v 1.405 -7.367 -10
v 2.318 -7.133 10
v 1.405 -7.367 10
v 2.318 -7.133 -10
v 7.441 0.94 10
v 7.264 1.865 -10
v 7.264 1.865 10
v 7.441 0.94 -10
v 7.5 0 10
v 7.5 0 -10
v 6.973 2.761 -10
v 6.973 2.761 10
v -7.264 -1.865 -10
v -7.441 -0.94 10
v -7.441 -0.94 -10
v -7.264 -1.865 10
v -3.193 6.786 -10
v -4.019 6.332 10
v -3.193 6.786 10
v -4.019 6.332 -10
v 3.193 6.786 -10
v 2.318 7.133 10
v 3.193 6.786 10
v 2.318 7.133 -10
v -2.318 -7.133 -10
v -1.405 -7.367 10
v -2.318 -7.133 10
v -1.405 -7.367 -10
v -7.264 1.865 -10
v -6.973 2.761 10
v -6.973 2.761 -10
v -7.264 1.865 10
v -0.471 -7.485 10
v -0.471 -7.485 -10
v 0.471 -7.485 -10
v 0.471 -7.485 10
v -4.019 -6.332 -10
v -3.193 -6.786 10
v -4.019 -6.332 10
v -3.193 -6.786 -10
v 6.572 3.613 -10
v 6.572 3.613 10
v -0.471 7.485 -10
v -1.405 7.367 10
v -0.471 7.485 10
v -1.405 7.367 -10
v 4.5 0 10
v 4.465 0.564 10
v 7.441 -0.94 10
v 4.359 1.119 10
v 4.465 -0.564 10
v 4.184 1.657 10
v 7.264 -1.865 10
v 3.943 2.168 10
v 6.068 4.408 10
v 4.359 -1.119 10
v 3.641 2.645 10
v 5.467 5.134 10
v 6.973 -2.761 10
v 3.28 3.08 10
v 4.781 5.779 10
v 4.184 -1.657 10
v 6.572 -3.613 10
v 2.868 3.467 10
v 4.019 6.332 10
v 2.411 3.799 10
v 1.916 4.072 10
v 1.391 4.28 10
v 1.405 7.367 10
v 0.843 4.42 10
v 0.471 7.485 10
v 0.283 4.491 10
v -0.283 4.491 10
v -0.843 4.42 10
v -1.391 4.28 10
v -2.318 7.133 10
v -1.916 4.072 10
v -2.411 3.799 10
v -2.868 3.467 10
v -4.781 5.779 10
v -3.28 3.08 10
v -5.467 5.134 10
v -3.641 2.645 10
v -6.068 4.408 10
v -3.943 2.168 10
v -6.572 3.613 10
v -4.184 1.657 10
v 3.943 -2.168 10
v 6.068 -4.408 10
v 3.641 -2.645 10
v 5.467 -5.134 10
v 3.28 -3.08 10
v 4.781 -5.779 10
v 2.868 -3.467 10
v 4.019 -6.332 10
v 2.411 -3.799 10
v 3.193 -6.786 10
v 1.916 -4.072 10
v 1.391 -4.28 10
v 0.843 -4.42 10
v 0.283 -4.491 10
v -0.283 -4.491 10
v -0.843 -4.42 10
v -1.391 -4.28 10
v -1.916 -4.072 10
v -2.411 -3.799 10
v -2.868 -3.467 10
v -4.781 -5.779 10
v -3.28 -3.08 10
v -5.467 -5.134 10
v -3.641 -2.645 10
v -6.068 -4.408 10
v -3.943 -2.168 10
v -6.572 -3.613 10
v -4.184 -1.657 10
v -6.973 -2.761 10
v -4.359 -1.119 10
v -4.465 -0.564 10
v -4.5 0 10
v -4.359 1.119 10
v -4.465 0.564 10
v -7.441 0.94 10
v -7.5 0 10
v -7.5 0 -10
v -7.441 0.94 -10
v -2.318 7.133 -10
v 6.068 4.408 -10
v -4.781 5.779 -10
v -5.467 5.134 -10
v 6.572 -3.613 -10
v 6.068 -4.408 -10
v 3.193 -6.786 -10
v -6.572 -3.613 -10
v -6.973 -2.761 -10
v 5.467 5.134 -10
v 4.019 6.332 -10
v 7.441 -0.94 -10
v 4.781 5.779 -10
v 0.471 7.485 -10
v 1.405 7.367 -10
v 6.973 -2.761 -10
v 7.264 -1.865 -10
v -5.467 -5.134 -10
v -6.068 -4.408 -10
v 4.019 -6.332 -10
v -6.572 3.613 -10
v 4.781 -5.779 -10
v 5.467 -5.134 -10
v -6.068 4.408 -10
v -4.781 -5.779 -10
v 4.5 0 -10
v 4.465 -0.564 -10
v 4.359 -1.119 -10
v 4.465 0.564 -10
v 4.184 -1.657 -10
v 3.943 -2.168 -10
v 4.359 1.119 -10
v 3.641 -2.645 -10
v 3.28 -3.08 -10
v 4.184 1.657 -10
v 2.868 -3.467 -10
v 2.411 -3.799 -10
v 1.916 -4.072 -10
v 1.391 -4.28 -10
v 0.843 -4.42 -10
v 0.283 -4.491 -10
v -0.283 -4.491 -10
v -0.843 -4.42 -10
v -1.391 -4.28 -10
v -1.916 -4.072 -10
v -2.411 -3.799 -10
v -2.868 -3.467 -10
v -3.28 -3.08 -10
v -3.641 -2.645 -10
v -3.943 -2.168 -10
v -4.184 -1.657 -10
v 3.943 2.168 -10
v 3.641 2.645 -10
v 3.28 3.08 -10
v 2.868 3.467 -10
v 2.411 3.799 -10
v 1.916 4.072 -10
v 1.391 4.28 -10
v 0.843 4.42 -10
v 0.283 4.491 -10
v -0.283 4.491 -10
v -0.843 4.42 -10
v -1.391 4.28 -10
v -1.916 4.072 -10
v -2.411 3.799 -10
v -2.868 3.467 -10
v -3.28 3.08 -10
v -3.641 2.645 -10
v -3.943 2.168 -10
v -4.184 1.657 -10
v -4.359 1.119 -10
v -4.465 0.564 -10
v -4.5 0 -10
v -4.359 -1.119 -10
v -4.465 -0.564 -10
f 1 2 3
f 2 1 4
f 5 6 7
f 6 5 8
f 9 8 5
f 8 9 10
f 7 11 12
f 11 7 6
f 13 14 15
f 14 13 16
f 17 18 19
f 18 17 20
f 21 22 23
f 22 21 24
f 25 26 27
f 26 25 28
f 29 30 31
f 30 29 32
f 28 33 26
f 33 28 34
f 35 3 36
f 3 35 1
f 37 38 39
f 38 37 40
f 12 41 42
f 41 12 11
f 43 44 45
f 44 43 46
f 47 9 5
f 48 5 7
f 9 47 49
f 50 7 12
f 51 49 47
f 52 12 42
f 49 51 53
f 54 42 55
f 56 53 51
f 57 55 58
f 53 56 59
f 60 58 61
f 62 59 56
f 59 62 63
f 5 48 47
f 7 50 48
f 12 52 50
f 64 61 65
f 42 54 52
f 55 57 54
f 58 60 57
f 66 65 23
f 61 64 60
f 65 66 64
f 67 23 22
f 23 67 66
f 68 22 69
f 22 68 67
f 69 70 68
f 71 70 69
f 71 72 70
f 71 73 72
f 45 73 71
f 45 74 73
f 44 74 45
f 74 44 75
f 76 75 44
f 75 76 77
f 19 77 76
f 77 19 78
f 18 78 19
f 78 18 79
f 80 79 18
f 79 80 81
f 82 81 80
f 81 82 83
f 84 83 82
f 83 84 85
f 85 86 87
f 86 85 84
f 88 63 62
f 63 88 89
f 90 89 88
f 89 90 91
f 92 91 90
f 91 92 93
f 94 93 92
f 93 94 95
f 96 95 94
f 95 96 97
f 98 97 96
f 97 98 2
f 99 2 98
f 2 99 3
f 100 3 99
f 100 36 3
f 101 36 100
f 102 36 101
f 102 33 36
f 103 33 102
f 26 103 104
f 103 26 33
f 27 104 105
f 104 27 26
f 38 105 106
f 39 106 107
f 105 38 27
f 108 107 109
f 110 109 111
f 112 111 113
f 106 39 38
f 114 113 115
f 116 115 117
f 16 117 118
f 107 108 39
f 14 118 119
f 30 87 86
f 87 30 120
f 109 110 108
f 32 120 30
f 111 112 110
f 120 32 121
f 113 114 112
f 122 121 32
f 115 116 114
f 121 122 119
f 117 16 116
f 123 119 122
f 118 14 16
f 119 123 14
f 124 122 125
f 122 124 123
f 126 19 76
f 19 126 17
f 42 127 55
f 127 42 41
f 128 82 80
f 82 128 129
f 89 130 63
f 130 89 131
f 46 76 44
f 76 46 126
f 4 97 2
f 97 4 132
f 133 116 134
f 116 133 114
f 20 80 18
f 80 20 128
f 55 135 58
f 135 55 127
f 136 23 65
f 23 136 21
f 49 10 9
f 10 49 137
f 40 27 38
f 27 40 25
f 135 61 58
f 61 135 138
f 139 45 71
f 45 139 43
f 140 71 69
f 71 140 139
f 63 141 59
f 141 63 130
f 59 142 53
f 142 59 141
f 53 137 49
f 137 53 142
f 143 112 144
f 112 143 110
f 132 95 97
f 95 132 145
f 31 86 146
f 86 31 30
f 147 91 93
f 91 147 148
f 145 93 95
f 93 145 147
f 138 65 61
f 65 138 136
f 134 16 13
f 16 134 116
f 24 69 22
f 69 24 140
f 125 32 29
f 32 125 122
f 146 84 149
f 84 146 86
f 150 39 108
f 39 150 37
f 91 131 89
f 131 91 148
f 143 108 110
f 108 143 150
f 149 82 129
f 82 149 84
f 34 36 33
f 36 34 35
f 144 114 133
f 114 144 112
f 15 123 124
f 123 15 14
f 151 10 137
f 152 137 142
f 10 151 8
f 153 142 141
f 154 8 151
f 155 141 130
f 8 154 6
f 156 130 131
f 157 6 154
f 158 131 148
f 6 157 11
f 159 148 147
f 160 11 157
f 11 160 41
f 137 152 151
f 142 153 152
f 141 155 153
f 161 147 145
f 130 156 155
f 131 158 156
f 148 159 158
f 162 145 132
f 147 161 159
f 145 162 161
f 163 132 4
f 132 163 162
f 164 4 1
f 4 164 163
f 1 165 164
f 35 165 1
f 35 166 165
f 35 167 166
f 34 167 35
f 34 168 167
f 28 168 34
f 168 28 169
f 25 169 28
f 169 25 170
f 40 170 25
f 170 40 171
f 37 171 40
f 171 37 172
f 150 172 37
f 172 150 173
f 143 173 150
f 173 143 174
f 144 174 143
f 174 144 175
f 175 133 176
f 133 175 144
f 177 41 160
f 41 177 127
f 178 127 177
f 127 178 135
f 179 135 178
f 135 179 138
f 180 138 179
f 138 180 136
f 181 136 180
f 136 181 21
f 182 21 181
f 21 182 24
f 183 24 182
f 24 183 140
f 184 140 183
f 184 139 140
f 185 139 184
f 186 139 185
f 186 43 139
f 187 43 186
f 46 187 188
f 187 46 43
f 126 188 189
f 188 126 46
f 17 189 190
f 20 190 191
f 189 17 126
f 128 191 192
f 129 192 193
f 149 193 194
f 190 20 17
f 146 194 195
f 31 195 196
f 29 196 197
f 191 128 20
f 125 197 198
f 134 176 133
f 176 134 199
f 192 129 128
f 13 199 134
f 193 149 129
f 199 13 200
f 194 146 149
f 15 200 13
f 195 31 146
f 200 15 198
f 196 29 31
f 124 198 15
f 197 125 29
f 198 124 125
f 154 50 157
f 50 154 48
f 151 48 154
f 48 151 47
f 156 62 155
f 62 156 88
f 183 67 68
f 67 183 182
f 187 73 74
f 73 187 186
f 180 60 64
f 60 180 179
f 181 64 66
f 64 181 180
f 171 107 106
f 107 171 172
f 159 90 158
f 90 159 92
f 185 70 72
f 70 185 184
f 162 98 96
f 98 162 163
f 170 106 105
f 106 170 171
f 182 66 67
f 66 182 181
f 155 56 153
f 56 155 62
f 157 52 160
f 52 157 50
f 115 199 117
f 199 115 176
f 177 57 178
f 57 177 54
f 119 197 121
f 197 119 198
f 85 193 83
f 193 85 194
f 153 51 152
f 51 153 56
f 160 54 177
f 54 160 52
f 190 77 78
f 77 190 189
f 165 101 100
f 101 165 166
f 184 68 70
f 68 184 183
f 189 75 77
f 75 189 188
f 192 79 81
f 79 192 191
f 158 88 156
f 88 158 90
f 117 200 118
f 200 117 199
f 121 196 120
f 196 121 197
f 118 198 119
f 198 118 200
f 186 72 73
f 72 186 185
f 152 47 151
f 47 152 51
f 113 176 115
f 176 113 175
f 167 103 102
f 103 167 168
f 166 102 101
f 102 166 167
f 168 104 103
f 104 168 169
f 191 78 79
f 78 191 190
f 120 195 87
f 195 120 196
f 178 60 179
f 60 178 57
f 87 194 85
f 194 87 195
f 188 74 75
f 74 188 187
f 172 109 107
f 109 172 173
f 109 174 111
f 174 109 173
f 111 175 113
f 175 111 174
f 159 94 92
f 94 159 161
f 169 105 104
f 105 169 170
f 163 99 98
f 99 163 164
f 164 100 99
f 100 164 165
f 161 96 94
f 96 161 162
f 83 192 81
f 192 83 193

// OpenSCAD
$fn = 50;


difference() {
	union() {
		translate(v = [0, 0, -10.0000000000]) {
			cylinder(h = 20, r = 7.5000000000);
		}
	}
	union() {
		translate(v = [0, 0, -100.0000000000]) {
			cylinder(h = 200, r = 4.5000000000);
		}
	}
}
